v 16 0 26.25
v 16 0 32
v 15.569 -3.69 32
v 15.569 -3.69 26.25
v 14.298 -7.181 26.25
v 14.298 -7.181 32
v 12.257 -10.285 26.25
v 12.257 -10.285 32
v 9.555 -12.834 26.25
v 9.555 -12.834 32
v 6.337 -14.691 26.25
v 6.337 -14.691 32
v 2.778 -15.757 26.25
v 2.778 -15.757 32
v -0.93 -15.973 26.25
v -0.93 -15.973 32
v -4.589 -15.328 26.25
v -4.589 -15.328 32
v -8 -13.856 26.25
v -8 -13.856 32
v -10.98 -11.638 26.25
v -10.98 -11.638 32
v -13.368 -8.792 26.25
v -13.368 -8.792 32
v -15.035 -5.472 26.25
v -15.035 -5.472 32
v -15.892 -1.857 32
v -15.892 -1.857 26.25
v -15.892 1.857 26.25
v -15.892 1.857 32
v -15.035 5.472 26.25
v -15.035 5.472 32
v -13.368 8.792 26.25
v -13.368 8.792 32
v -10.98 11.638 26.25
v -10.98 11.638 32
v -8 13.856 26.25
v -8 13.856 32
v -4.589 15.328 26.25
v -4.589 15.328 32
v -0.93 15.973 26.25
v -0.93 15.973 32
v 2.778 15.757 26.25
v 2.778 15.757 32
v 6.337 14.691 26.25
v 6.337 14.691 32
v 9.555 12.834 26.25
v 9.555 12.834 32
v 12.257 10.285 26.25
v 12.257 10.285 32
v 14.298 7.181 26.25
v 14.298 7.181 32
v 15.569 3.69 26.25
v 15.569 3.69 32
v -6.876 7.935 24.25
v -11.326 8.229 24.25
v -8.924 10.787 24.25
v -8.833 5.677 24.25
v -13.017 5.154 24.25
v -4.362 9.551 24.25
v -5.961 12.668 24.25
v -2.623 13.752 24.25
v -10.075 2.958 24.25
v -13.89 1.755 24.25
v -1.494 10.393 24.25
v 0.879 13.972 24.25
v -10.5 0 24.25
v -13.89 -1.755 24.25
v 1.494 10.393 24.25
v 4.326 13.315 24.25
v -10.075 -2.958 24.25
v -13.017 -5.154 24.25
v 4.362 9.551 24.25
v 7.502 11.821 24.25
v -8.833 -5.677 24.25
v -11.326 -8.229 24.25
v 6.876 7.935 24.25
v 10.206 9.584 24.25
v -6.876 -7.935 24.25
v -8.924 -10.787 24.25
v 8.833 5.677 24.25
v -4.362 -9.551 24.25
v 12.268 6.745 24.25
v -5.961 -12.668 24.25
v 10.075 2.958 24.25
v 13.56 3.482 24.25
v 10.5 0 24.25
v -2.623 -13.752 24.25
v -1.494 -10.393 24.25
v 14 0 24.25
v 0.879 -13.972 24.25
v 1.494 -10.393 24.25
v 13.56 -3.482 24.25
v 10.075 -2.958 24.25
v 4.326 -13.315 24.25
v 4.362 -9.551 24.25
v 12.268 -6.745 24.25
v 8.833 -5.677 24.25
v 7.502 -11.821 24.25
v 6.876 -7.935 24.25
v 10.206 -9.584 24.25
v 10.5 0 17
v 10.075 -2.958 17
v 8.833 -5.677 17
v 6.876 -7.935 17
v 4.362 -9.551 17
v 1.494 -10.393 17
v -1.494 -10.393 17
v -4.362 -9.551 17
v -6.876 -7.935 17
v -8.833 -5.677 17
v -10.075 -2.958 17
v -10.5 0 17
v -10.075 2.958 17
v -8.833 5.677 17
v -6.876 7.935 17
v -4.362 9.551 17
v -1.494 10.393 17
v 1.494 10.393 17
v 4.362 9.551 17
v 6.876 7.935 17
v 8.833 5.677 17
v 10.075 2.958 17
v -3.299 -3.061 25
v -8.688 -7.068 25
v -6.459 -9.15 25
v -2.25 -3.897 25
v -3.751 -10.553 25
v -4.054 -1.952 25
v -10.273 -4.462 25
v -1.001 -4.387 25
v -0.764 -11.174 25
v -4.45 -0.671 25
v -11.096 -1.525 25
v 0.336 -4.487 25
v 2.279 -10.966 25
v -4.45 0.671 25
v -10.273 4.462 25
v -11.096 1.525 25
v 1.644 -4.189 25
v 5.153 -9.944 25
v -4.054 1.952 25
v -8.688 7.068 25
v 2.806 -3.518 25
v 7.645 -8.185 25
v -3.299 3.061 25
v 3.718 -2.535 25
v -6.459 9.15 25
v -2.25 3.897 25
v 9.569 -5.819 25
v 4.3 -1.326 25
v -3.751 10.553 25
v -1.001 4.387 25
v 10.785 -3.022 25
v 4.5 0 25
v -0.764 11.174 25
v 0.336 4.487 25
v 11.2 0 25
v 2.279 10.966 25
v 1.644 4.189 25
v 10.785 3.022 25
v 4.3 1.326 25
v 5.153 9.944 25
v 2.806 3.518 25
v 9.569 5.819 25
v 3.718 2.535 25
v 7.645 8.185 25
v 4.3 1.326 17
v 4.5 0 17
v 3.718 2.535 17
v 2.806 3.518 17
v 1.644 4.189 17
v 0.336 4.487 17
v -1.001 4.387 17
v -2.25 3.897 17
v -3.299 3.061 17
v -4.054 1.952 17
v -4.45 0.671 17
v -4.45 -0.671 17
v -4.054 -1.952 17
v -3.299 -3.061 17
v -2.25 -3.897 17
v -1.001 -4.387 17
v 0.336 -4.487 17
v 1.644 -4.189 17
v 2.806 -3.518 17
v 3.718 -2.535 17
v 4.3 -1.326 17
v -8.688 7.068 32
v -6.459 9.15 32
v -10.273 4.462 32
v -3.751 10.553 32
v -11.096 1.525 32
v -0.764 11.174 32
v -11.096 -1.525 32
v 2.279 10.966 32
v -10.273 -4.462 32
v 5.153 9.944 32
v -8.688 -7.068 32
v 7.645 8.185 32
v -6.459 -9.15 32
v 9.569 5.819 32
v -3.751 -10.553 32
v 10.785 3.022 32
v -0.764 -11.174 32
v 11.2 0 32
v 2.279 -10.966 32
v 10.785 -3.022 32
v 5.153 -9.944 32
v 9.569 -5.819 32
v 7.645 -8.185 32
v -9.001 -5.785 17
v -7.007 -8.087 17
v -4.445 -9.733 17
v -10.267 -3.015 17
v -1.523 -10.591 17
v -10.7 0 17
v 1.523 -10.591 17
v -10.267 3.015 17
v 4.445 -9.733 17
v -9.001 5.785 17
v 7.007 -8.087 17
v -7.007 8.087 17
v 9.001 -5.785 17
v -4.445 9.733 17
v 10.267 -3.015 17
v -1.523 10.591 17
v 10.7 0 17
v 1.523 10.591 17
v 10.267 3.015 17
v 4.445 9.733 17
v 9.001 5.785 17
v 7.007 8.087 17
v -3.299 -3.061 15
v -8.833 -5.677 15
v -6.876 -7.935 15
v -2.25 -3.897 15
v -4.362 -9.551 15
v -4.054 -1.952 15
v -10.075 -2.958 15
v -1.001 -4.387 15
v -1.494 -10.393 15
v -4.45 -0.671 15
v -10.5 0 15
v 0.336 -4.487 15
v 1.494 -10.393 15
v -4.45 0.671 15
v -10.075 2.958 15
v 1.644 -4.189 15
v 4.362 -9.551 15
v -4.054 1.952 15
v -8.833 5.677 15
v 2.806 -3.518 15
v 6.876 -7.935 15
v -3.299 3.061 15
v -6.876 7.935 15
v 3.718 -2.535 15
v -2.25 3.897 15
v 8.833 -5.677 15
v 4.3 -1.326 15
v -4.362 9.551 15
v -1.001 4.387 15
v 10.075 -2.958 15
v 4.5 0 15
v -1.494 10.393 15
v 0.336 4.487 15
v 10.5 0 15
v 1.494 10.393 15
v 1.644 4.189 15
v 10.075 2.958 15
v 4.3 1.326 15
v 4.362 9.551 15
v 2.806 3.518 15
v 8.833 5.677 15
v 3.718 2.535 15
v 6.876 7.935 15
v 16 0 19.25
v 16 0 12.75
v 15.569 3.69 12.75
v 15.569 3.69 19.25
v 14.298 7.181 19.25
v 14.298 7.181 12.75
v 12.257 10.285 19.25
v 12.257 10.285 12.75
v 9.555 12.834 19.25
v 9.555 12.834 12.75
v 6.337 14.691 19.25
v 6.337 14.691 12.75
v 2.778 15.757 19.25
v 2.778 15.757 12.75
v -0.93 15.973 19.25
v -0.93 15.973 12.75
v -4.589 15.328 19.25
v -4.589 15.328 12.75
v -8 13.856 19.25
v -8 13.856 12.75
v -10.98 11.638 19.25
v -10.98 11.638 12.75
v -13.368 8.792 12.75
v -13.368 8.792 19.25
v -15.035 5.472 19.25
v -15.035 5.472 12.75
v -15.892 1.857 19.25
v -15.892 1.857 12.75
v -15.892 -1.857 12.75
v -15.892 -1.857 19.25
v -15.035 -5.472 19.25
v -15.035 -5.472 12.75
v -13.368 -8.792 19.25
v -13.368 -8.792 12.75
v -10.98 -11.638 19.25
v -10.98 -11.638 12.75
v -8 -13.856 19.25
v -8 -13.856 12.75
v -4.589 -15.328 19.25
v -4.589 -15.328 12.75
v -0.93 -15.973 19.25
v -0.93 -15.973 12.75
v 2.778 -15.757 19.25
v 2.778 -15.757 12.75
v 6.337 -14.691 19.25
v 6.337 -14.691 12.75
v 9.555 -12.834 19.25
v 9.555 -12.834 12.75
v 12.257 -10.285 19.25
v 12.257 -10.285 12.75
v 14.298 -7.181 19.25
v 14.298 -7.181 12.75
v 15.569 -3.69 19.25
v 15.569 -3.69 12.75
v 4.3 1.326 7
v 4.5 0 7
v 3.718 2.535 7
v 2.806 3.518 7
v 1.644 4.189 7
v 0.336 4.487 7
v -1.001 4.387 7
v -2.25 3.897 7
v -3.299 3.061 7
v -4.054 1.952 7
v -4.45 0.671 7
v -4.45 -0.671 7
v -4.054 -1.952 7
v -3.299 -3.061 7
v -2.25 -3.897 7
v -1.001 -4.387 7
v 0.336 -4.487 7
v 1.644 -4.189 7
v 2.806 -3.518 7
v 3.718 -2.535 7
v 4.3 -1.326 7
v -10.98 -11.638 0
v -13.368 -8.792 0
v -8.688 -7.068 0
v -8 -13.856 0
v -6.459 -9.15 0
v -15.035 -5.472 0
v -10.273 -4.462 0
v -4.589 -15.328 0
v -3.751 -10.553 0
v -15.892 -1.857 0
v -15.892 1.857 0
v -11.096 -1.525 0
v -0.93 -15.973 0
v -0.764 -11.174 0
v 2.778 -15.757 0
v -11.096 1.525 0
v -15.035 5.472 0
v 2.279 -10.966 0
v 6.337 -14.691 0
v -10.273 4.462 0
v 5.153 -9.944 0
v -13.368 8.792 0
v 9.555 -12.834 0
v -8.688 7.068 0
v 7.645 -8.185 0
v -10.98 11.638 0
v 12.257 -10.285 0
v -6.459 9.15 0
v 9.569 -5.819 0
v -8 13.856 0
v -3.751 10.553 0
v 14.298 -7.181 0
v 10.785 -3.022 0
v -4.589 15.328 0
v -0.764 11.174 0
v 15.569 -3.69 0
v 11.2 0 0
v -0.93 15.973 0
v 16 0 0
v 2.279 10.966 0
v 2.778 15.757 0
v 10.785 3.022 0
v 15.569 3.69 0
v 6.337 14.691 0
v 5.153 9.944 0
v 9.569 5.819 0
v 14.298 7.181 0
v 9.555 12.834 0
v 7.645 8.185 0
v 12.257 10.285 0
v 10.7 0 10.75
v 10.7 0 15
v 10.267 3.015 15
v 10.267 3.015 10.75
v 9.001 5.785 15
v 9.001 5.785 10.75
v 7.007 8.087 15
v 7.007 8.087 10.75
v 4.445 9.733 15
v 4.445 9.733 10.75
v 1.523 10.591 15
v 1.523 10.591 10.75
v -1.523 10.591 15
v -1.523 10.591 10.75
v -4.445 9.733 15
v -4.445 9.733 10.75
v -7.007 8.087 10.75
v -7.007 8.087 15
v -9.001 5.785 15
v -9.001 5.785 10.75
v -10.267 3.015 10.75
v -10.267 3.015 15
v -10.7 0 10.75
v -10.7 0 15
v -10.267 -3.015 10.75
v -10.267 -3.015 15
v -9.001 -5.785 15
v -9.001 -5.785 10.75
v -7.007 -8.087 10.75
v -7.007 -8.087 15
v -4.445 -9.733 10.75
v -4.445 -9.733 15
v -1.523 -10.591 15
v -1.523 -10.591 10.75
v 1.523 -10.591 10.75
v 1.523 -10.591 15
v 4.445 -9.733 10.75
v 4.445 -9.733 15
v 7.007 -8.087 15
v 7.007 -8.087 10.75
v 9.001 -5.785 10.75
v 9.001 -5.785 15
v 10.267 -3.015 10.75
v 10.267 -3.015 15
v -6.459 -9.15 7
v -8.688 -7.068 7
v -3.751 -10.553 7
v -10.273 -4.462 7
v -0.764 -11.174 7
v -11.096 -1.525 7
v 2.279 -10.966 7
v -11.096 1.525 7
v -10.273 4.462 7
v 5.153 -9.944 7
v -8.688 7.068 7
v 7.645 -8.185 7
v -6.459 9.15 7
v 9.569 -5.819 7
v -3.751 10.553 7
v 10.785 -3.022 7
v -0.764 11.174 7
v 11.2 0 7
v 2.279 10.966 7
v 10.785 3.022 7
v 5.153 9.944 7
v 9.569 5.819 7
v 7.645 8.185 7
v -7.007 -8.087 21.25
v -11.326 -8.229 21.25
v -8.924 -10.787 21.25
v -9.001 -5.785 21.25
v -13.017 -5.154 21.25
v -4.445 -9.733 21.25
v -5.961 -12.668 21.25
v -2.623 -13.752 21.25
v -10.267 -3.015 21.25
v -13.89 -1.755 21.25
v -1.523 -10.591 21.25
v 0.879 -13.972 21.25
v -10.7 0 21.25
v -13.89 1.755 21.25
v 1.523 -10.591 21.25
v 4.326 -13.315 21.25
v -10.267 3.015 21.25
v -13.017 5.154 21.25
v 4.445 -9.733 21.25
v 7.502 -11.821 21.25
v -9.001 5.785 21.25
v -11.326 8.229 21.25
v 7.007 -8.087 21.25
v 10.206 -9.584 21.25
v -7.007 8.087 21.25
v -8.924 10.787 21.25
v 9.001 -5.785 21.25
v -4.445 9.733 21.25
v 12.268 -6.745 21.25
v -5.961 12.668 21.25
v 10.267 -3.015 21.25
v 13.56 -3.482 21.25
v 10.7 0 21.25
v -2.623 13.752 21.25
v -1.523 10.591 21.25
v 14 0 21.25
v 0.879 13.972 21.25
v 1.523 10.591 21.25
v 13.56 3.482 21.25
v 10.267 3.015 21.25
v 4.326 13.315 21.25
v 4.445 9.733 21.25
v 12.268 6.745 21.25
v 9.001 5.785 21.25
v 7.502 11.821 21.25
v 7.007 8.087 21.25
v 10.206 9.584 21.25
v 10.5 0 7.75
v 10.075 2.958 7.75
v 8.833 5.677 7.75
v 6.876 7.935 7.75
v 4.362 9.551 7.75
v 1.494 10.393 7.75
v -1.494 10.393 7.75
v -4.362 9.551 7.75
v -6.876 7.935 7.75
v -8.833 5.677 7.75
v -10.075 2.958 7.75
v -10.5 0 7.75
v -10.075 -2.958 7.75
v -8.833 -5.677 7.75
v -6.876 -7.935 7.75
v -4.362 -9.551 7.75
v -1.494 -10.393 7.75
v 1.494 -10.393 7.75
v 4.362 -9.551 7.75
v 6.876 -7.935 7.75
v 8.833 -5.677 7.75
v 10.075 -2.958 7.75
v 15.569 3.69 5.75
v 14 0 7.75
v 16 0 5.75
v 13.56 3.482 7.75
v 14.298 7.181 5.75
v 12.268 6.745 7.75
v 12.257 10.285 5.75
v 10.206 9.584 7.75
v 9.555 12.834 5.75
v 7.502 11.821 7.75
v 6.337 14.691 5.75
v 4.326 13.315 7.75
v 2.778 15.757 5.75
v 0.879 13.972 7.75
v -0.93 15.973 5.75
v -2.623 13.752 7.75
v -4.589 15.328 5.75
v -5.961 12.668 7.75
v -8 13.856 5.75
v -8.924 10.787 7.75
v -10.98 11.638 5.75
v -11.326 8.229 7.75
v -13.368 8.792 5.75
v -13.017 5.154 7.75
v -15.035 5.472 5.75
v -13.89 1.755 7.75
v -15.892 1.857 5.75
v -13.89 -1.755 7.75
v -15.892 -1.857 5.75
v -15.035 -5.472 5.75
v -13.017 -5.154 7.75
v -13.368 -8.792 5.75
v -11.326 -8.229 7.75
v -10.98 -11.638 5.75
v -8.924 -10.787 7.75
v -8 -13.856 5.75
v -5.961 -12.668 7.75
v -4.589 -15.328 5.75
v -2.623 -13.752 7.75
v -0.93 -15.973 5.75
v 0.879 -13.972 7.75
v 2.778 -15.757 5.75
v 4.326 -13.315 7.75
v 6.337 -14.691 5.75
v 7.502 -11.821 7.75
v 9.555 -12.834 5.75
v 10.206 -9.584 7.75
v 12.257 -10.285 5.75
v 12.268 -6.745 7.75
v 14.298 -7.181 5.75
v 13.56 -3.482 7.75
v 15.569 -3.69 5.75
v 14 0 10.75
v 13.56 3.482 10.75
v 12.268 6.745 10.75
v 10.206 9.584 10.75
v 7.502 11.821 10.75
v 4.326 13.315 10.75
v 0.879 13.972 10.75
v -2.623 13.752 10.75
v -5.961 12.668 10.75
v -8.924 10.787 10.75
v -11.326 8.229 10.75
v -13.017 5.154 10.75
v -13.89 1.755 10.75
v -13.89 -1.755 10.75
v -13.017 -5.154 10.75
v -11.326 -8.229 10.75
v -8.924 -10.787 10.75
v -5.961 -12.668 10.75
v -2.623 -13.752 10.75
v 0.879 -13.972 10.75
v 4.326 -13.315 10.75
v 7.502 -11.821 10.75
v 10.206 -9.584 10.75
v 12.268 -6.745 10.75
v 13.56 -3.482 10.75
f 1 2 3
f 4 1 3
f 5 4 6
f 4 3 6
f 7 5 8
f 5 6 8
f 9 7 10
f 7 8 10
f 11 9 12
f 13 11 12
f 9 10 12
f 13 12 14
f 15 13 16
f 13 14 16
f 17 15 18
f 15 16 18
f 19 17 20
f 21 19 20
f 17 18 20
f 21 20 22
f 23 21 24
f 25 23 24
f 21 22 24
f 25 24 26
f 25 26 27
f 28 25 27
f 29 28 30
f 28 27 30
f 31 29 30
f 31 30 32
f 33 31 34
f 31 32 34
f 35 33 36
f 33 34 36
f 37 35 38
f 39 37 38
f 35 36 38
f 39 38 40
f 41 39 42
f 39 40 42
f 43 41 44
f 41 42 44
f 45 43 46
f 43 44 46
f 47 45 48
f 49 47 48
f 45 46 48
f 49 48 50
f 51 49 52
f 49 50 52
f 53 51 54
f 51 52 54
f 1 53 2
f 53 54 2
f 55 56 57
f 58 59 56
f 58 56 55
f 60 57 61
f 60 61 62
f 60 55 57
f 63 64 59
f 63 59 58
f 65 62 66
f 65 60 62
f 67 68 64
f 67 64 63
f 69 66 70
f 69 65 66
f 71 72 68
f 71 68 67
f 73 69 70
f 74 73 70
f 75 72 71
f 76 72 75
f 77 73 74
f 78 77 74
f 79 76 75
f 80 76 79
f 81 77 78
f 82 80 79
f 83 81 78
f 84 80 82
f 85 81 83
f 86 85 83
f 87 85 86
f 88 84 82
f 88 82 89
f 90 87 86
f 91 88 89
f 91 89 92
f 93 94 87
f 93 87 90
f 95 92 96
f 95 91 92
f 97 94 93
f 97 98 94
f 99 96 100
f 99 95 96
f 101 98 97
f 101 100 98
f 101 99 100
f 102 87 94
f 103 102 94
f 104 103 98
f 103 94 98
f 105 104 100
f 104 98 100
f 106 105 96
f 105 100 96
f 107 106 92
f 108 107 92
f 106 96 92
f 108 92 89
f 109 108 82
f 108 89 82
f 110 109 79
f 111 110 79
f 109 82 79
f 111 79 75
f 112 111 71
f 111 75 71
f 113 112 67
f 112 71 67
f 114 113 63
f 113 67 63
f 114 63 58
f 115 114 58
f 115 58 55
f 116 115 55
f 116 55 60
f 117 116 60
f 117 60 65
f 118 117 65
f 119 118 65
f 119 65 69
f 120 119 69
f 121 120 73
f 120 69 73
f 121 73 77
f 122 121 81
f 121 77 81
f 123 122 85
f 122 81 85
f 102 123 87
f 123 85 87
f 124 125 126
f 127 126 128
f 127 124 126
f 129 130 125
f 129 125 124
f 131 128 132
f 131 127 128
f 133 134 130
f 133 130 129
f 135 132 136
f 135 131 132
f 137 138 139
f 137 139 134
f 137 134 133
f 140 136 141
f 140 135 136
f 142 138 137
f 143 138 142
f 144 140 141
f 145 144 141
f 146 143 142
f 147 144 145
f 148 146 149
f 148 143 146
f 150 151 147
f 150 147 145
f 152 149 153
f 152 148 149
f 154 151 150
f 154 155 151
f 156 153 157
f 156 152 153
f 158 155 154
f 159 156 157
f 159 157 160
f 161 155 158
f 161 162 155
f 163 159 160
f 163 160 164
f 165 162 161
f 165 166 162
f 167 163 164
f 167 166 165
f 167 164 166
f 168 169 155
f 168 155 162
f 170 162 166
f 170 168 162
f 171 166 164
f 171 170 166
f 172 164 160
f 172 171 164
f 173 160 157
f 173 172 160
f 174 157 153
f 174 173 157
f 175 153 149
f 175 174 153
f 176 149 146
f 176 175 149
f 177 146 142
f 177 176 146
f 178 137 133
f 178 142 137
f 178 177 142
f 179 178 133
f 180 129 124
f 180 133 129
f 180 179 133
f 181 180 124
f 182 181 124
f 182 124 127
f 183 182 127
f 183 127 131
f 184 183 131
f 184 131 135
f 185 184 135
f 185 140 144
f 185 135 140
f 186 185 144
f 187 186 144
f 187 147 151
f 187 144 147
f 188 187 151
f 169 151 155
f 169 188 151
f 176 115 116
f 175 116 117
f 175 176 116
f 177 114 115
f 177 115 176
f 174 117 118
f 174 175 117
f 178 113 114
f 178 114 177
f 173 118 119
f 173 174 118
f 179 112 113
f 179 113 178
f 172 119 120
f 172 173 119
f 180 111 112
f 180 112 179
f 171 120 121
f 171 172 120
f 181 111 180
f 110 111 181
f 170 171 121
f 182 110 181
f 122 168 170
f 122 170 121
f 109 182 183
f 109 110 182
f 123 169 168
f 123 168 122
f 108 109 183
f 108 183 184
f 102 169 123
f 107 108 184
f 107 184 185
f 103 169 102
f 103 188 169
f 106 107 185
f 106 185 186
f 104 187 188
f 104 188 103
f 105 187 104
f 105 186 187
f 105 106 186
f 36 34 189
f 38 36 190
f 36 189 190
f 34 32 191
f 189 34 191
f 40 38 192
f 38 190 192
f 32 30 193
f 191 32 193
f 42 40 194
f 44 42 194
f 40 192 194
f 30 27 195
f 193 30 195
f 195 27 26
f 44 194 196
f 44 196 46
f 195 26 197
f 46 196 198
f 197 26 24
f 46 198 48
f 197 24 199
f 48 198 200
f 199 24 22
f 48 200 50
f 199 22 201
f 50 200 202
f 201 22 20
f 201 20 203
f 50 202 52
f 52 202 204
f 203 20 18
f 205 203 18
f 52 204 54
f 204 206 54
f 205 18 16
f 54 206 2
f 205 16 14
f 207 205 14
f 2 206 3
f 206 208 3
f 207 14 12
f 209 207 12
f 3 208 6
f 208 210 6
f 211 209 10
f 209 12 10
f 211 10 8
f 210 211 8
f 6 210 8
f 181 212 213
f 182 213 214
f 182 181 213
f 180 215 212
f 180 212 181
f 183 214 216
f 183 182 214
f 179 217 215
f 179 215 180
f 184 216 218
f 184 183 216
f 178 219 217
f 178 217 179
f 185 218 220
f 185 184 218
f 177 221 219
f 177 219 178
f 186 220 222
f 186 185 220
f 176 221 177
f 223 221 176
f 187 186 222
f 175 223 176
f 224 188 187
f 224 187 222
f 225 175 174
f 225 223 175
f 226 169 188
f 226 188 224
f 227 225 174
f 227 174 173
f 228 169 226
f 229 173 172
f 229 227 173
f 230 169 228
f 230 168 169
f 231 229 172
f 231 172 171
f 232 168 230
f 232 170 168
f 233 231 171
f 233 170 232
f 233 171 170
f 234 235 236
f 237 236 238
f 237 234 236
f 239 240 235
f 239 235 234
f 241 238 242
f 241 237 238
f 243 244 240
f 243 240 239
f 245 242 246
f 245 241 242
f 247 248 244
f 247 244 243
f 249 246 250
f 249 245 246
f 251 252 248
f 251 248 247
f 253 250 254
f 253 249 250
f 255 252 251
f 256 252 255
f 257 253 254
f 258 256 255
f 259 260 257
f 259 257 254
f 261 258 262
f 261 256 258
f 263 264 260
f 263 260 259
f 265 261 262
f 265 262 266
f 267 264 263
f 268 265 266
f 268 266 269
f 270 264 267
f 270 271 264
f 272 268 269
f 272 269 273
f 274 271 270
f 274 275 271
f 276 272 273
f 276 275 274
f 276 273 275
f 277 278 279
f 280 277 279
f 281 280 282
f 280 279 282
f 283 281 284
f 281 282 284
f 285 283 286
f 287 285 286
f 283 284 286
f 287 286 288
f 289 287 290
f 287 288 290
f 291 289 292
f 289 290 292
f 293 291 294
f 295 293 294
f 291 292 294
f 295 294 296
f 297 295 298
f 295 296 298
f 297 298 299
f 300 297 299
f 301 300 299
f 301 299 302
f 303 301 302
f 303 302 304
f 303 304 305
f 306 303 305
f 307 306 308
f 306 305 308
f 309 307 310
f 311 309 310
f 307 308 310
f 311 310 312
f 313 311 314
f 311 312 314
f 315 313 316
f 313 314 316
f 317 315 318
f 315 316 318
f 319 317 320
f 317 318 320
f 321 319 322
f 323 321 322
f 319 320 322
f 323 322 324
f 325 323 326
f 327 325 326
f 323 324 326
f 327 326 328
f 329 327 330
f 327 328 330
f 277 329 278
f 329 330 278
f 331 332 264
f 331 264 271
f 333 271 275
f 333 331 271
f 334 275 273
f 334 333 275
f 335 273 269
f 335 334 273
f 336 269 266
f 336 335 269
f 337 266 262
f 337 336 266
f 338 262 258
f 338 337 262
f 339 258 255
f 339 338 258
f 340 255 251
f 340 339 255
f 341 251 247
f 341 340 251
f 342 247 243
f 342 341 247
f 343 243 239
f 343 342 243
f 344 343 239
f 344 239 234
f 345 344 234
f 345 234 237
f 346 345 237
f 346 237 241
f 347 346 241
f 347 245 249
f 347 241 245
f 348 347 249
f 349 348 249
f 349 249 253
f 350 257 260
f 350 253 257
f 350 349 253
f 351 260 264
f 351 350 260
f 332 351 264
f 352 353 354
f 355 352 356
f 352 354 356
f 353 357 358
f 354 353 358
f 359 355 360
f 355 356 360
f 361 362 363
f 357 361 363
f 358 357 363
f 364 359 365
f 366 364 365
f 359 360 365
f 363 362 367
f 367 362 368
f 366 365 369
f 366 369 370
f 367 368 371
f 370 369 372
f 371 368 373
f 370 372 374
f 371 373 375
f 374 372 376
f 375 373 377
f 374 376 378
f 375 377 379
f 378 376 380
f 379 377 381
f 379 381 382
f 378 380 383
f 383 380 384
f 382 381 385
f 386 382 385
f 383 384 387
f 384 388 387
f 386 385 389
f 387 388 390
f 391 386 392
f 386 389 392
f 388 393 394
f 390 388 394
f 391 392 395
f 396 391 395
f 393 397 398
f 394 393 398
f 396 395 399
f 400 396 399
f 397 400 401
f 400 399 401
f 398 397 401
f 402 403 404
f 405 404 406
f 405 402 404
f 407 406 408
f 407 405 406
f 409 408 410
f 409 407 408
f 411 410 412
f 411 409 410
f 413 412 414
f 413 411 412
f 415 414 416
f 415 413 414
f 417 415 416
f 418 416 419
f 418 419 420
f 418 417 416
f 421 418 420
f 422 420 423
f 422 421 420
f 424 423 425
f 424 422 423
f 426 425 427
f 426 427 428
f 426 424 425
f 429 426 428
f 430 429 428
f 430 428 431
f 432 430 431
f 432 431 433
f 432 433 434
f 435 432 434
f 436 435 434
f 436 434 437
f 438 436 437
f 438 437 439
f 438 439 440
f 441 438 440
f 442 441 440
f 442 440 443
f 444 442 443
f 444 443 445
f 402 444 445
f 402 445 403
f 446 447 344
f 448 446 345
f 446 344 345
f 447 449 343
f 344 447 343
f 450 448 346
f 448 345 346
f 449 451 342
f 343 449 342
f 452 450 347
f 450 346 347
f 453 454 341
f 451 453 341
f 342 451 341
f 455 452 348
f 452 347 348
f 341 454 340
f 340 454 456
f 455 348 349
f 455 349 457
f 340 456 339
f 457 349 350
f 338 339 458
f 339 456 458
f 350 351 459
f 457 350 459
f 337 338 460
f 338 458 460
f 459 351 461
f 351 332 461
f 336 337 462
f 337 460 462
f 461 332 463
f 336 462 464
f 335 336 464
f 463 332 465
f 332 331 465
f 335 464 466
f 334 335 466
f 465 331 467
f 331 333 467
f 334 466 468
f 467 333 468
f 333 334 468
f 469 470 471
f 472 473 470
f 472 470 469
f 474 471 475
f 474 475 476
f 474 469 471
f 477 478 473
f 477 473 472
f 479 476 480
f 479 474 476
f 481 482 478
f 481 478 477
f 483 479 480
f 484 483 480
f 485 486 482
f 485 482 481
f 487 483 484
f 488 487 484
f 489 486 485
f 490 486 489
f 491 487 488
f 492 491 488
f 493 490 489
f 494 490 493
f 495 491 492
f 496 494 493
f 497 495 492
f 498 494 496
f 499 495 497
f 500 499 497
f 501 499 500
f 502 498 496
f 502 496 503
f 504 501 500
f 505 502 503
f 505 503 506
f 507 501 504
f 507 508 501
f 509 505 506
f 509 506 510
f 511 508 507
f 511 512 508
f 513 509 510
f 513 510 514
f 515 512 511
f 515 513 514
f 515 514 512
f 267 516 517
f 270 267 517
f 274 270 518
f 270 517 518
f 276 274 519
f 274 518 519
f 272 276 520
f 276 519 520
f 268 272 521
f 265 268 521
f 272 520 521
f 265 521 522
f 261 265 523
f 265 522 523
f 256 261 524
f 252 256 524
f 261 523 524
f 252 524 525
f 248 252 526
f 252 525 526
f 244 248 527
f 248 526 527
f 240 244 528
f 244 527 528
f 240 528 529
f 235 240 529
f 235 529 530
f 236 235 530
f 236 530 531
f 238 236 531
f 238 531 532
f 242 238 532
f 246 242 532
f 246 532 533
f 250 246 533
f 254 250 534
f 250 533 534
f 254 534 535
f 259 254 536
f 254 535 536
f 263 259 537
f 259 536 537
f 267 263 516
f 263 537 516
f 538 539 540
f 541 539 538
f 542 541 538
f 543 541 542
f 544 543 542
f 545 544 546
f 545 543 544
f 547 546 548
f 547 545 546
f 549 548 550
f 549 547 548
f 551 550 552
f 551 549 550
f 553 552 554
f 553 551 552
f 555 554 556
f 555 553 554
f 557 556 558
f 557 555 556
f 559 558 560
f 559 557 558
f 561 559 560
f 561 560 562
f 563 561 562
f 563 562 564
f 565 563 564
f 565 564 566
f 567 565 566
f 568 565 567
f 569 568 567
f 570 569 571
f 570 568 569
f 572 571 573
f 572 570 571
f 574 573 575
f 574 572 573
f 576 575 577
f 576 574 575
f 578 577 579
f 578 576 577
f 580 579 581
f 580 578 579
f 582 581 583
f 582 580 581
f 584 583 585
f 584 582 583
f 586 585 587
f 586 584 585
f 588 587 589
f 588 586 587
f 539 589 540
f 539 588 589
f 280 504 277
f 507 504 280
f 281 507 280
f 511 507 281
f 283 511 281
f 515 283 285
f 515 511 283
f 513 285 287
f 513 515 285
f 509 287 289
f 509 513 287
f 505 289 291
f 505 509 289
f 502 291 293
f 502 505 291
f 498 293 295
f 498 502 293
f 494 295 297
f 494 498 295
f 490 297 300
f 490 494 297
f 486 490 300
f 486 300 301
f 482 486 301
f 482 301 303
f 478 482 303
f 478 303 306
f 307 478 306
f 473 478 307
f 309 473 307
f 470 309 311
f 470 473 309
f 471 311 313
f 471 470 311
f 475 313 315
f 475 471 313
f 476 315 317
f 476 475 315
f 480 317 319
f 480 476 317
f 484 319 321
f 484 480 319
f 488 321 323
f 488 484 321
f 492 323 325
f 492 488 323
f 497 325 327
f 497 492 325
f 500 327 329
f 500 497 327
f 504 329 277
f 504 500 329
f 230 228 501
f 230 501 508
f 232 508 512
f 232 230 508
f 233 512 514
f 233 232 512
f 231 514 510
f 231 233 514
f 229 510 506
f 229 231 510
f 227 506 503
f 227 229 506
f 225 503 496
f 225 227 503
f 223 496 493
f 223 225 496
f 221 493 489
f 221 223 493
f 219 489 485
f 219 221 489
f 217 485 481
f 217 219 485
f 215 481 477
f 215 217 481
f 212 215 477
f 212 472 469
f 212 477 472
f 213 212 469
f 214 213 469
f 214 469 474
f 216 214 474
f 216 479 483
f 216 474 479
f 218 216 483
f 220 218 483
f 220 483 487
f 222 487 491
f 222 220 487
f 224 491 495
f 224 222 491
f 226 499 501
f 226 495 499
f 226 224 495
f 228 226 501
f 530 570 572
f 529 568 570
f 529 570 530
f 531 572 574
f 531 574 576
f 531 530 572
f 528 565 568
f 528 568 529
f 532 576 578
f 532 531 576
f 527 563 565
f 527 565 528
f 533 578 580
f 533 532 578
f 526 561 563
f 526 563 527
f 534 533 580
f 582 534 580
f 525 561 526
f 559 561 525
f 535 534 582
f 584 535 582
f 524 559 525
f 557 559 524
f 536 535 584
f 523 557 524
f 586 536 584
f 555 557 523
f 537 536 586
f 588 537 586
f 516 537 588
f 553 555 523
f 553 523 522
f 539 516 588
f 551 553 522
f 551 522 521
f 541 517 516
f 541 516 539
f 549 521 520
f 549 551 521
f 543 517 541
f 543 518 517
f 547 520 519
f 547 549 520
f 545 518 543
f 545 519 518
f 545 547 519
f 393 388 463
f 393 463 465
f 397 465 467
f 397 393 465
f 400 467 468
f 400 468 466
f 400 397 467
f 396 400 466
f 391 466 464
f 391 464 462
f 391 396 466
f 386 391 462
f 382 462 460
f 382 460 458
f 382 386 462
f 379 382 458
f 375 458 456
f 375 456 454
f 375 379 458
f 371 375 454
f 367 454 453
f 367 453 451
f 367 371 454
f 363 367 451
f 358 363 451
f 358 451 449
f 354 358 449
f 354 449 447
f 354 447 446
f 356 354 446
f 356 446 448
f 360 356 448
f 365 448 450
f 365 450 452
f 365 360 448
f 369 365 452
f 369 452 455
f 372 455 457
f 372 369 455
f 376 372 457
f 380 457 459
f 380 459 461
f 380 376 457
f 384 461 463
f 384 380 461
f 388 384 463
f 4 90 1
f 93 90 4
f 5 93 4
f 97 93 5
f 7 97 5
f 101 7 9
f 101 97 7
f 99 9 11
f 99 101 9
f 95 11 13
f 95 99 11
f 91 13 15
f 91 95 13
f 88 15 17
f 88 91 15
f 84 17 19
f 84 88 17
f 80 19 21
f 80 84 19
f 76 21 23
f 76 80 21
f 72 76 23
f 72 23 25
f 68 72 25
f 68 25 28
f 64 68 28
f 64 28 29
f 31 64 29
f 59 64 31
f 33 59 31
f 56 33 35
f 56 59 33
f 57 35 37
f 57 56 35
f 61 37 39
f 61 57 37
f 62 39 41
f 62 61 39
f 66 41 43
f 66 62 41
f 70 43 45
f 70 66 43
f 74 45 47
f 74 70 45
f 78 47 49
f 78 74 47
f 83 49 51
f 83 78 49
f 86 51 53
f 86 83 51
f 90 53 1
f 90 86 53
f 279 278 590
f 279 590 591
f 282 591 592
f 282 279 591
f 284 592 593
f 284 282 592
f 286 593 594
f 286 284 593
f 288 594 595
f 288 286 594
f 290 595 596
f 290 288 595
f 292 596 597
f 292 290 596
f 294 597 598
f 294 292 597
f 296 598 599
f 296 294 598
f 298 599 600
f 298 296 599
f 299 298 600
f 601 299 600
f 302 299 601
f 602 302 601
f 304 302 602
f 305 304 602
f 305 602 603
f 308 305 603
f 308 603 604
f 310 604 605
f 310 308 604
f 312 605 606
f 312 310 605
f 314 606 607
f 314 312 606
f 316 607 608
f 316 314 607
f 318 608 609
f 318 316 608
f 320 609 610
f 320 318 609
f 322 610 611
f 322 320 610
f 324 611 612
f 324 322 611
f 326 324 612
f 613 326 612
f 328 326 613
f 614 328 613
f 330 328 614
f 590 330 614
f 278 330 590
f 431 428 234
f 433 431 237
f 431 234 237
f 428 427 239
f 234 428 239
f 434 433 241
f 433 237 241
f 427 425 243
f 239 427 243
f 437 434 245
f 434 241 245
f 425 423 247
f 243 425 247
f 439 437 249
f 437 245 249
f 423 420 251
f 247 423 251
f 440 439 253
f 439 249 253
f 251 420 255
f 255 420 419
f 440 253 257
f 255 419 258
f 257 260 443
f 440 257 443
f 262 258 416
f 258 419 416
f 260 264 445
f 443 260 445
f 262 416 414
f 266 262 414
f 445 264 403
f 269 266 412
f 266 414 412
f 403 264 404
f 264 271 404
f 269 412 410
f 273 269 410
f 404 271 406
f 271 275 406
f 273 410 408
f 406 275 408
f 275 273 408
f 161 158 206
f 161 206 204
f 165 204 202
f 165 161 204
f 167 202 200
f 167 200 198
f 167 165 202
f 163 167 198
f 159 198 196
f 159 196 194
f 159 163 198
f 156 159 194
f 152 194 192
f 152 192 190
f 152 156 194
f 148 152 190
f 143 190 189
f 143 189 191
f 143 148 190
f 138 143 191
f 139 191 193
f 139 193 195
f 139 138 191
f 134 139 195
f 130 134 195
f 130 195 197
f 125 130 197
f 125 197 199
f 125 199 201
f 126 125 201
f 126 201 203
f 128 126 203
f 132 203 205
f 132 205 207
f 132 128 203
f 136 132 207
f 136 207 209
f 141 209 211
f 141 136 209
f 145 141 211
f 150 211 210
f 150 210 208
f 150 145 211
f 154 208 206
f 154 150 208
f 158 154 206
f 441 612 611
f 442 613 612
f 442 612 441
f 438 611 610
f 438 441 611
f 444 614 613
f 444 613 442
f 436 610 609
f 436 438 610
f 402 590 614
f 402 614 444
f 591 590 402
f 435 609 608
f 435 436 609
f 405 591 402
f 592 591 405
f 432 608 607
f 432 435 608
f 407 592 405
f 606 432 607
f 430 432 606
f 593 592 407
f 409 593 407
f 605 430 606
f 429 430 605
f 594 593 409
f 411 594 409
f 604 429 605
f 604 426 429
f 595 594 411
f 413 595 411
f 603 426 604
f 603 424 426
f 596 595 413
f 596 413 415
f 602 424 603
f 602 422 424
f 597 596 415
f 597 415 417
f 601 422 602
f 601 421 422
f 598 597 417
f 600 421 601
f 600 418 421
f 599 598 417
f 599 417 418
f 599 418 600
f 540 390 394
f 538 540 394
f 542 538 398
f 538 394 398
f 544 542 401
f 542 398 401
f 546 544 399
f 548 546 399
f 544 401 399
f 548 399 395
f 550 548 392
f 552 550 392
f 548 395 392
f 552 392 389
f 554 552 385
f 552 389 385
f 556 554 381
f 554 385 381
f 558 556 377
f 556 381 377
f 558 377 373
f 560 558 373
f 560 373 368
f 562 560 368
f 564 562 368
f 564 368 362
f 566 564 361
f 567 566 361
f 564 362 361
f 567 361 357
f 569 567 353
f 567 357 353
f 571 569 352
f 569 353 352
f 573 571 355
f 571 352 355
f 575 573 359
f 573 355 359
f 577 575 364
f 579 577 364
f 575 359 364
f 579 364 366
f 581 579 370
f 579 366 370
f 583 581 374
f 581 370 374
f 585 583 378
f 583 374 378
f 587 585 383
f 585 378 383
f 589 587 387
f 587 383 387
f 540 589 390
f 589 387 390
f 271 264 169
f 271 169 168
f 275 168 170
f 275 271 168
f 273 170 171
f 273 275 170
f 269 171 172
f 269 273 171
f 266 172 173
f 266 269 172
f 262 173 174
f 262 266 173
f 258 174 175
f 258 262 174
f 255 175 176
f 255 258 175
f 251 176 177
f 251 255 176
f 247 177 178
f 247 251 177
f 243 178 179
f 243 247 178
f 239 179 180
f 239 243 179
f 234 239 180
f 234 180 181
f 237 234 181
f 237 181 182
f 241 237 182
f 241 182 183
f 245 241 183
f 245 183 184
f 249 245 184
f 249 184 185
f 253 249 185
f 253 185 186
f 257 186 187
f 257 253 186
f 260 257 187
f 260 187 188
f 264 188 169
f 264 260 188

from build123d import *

# Parameters (mm, degrees)
CYLINDER006_R             = 10.7
CYLINDER006_DEPTH         = 7.25
CYLINDER007_R             = 4.5
CYLINDER007_DEPTH         = 32
CYLINDER005_R             = 10.7
CYLINDER005_DEPTH         = 7.25
CYLINDER004_R             = 16
CYLINDER004_DEPTH         = 6.5
CYLINDER010_R             = 11.2
CYLINDER010_DEPTH         = 7
CYLINDER009_R             = 4.5
CYLINDER009_DEPTH         = 32
CYLINDER001_R             = 10.5
CYLINDER001_DEPTH         = 7.25
CYLINDER_R                = 16
CYLINDER_DEPTH            = 5.75
CYLINDER011_R             = 11.2
CYLINDER011_DEPTH         = 7
CYLINDER008_R             = 4.5
CYLINDER008_DEPTH         = 32
CYLINDER003_R             = 10.5
CYLINDER003_DEPTH         = 7.25
CYLINDER002_R             = 16
CYLINDER002_DEPTH         = 5.75
FUSION001_PLACEMENT_ANGLE = 180


with BuildPart() as cylinder006:
    # Cylinder006 → Cylinder006 (new body)
    with BuildSketch(Plane.XY.offset(7.75)):
        Circle(CYLINDER006_R)
    extrude(amount=CYLINDER006_DEPTH)


with BuildPart() as cylinder007:
    # Cylinder007 → Cylinder007 (new body)
    with BuildSketch(Plane.XY):
        Circle(CYLINDER007_R)
    extrude(amount=CYLINDER007_DEPTH)


with BuildPart() as fusion003:
    # Cylinder005 → Cylinder005 (new body)
    with BuildSketch(Plane.XY.offset(17)):
        Circle(CYLINDER005_R)
    extrude(amount=CYLINDER005_DEPTH)

    # Fusion003: union Cylinder006, Cylinder007
    add(cylinder006.part)
    add(cylinder007.part)


with BuildPart() as cone002:
    # Cone002 → Cone002 (revolve)
    with BuildSketch(Plane(origin=(0, 0, 8.5), x_dir=(1, 0, 0), z_dir=(0, -1, 0))):
        Polygon((0, 0), (16, 0), (14, 2), (0, 2), align=None)
    revolve(axis=Axis((0, 0, 8.5), (0, 0, 1)))


with BuildPart() as cone003:
    # Cone003 → Cone003 (revolve)
    with BuildSketch(Plane.XZ):
        Polygon((0, 0), (14, 0), (16, 2), (0, 2), align=None)
    revolve(axis=Axis((0, 0, 0), (0, 0, 1)))


with BuildPart() as cut:
    # Cylinder004 → Cylinder004 (new body)
    with BuildSketch(Plane.XY.offset(2)):
        Circle(CYLINDER004_R)
    extrude(amount=CYLINDER004_DEPTH)

    # Fusion002: union Cone002, Cone003
    add(cone002.part)
    add(cone003.part)


with BuildPart() as cut_1:
    # Fusion002 placement: moved
    add(cut.part.moved(Location((0, 0, 10.75))))

    # Cut: cut Fusion003
    add(fusion003.part, mode=Mode.SUBTRACT)


with BuildPart() as cylinder010:
    # Cylinder010 → Cylinder010 (new body)
    with BuildSketch(Plane.XY):
        Circle(CYLINDER010_R)
    extrude(amount=CYLINDER010_DEPTH)


with BuildPart() as cylinder009:
    # Cylinder009 → Cylinder009 (new body)
    with BuildSketch(Plane.XY):
        Circle(CYLINDER009_R)
    extrude(amount=CYLINDER009_DEPTH)


with BuildPart() as cone:
    # Cone → Cone (revolve)
    with BuildSketch(Plane(origin=(0, 0, 5.75), x_dir=(1, 0, 0), z_dir=(0, -1, 0))):
        Polygon((0, 0), (16, 0), (14, 2), (0, 2), align=None)
    revolve(axis=Axis((0, 0, 5.75), (0, 0, 1)))


with BuildPart() as cylinder001:
    # Cylinder001 → Cylinder001 (new body)
    with BuildSketch(Plane.XY.offset(7.75)):
        Circle(CYLINDER001_R)
    extrude(amount=CYLINDER001_DEPTH)


with BuildPart() as cut003:
    # Cylinder → Cylinder (new body)
    with BuildSketch(Plane.XY):
        Circle(CYLINDER_R)
    extrude(amount=CYLINDER_DEPTH)

    # Fusion: union Cone, Cylinder001
    add(cone.part)
    add(cylinder001.part)

    # Cut002: cut Cylinder009
    add(cylinder009.part, mode=Mode.SUBTRACT)

    # Cut003: cut Cylinder010
    add(cylinder010.part, mode=Mode.SUBTRACT)


with BuildPart() as cylinder011:
    # Cylinder011 → Cylinder011 (new body)
    with BuildSketch(Plane.XY.offset(25)):
        Circle(CYLINDER011_R)
    extrude(amount=CYLINDER011_DEPTH)


with BuildPart() as cylinder008:
    # Cylinder008 → Cylinder008 (new body)
    with BuildSketch(Plane.XY):
        Circle(CYLINDER008_R)
    extrude(amount=CYLINDER008_DEPTH)


with BuildPart() as cone001:
    # Cone001 → Cone001 (revolve)
    with BuildSketch(Plane(origin=(0, 0, 5.75), x_dir=(1, 0, 0), z_dir=(0, -1, 0))):
        Polygon((0, 0), (16, 0), (14, 2), (0, 2), align=None)
    revolve(axis=Axis((0, 0, 5.75), (0, 0, 1)))


with BuildPart() as cylinder003:
    # Cylinder003 → Cylinder003 (new body)
    with BuildSketch(Plane.XY.offset(7.75)):
        Circle(CYLINDER003_R)
    extrude(amount=CYLINDER003_DEPTH)


with BuildPart() as cut004:
    # Cylinder002 → Cylinder002 (new body)
    with BuildSketch(Plane.XY):
        Circle(CYLINDER002_R)
    extrude(amount=CYLINDER002_DEPTH)

    # Fusion001: union Cone001, Cylinder003
    add(cone001.part)
    add(cylinder003.part)


with BuildPart() as cut004_1:
    # Fusion001 placement: moved
    add(cut004.part.moved(Location((0, 0, 32))).rotate(Axis((0, 0, 32), (1, 0, 0)), FUSION001_PLACEMENT_ANGLE))

    # Cut001: cut Cylinder008
    add(cylinder008.part, mode=Mode.SUBTRACT)

    # Cut004: cut Cylinder011
    add(cylinder011.part, mode=Mode.SUBTRACT)


solid = Compound([cut_1.part, cut003.part, cut004_1.part])
